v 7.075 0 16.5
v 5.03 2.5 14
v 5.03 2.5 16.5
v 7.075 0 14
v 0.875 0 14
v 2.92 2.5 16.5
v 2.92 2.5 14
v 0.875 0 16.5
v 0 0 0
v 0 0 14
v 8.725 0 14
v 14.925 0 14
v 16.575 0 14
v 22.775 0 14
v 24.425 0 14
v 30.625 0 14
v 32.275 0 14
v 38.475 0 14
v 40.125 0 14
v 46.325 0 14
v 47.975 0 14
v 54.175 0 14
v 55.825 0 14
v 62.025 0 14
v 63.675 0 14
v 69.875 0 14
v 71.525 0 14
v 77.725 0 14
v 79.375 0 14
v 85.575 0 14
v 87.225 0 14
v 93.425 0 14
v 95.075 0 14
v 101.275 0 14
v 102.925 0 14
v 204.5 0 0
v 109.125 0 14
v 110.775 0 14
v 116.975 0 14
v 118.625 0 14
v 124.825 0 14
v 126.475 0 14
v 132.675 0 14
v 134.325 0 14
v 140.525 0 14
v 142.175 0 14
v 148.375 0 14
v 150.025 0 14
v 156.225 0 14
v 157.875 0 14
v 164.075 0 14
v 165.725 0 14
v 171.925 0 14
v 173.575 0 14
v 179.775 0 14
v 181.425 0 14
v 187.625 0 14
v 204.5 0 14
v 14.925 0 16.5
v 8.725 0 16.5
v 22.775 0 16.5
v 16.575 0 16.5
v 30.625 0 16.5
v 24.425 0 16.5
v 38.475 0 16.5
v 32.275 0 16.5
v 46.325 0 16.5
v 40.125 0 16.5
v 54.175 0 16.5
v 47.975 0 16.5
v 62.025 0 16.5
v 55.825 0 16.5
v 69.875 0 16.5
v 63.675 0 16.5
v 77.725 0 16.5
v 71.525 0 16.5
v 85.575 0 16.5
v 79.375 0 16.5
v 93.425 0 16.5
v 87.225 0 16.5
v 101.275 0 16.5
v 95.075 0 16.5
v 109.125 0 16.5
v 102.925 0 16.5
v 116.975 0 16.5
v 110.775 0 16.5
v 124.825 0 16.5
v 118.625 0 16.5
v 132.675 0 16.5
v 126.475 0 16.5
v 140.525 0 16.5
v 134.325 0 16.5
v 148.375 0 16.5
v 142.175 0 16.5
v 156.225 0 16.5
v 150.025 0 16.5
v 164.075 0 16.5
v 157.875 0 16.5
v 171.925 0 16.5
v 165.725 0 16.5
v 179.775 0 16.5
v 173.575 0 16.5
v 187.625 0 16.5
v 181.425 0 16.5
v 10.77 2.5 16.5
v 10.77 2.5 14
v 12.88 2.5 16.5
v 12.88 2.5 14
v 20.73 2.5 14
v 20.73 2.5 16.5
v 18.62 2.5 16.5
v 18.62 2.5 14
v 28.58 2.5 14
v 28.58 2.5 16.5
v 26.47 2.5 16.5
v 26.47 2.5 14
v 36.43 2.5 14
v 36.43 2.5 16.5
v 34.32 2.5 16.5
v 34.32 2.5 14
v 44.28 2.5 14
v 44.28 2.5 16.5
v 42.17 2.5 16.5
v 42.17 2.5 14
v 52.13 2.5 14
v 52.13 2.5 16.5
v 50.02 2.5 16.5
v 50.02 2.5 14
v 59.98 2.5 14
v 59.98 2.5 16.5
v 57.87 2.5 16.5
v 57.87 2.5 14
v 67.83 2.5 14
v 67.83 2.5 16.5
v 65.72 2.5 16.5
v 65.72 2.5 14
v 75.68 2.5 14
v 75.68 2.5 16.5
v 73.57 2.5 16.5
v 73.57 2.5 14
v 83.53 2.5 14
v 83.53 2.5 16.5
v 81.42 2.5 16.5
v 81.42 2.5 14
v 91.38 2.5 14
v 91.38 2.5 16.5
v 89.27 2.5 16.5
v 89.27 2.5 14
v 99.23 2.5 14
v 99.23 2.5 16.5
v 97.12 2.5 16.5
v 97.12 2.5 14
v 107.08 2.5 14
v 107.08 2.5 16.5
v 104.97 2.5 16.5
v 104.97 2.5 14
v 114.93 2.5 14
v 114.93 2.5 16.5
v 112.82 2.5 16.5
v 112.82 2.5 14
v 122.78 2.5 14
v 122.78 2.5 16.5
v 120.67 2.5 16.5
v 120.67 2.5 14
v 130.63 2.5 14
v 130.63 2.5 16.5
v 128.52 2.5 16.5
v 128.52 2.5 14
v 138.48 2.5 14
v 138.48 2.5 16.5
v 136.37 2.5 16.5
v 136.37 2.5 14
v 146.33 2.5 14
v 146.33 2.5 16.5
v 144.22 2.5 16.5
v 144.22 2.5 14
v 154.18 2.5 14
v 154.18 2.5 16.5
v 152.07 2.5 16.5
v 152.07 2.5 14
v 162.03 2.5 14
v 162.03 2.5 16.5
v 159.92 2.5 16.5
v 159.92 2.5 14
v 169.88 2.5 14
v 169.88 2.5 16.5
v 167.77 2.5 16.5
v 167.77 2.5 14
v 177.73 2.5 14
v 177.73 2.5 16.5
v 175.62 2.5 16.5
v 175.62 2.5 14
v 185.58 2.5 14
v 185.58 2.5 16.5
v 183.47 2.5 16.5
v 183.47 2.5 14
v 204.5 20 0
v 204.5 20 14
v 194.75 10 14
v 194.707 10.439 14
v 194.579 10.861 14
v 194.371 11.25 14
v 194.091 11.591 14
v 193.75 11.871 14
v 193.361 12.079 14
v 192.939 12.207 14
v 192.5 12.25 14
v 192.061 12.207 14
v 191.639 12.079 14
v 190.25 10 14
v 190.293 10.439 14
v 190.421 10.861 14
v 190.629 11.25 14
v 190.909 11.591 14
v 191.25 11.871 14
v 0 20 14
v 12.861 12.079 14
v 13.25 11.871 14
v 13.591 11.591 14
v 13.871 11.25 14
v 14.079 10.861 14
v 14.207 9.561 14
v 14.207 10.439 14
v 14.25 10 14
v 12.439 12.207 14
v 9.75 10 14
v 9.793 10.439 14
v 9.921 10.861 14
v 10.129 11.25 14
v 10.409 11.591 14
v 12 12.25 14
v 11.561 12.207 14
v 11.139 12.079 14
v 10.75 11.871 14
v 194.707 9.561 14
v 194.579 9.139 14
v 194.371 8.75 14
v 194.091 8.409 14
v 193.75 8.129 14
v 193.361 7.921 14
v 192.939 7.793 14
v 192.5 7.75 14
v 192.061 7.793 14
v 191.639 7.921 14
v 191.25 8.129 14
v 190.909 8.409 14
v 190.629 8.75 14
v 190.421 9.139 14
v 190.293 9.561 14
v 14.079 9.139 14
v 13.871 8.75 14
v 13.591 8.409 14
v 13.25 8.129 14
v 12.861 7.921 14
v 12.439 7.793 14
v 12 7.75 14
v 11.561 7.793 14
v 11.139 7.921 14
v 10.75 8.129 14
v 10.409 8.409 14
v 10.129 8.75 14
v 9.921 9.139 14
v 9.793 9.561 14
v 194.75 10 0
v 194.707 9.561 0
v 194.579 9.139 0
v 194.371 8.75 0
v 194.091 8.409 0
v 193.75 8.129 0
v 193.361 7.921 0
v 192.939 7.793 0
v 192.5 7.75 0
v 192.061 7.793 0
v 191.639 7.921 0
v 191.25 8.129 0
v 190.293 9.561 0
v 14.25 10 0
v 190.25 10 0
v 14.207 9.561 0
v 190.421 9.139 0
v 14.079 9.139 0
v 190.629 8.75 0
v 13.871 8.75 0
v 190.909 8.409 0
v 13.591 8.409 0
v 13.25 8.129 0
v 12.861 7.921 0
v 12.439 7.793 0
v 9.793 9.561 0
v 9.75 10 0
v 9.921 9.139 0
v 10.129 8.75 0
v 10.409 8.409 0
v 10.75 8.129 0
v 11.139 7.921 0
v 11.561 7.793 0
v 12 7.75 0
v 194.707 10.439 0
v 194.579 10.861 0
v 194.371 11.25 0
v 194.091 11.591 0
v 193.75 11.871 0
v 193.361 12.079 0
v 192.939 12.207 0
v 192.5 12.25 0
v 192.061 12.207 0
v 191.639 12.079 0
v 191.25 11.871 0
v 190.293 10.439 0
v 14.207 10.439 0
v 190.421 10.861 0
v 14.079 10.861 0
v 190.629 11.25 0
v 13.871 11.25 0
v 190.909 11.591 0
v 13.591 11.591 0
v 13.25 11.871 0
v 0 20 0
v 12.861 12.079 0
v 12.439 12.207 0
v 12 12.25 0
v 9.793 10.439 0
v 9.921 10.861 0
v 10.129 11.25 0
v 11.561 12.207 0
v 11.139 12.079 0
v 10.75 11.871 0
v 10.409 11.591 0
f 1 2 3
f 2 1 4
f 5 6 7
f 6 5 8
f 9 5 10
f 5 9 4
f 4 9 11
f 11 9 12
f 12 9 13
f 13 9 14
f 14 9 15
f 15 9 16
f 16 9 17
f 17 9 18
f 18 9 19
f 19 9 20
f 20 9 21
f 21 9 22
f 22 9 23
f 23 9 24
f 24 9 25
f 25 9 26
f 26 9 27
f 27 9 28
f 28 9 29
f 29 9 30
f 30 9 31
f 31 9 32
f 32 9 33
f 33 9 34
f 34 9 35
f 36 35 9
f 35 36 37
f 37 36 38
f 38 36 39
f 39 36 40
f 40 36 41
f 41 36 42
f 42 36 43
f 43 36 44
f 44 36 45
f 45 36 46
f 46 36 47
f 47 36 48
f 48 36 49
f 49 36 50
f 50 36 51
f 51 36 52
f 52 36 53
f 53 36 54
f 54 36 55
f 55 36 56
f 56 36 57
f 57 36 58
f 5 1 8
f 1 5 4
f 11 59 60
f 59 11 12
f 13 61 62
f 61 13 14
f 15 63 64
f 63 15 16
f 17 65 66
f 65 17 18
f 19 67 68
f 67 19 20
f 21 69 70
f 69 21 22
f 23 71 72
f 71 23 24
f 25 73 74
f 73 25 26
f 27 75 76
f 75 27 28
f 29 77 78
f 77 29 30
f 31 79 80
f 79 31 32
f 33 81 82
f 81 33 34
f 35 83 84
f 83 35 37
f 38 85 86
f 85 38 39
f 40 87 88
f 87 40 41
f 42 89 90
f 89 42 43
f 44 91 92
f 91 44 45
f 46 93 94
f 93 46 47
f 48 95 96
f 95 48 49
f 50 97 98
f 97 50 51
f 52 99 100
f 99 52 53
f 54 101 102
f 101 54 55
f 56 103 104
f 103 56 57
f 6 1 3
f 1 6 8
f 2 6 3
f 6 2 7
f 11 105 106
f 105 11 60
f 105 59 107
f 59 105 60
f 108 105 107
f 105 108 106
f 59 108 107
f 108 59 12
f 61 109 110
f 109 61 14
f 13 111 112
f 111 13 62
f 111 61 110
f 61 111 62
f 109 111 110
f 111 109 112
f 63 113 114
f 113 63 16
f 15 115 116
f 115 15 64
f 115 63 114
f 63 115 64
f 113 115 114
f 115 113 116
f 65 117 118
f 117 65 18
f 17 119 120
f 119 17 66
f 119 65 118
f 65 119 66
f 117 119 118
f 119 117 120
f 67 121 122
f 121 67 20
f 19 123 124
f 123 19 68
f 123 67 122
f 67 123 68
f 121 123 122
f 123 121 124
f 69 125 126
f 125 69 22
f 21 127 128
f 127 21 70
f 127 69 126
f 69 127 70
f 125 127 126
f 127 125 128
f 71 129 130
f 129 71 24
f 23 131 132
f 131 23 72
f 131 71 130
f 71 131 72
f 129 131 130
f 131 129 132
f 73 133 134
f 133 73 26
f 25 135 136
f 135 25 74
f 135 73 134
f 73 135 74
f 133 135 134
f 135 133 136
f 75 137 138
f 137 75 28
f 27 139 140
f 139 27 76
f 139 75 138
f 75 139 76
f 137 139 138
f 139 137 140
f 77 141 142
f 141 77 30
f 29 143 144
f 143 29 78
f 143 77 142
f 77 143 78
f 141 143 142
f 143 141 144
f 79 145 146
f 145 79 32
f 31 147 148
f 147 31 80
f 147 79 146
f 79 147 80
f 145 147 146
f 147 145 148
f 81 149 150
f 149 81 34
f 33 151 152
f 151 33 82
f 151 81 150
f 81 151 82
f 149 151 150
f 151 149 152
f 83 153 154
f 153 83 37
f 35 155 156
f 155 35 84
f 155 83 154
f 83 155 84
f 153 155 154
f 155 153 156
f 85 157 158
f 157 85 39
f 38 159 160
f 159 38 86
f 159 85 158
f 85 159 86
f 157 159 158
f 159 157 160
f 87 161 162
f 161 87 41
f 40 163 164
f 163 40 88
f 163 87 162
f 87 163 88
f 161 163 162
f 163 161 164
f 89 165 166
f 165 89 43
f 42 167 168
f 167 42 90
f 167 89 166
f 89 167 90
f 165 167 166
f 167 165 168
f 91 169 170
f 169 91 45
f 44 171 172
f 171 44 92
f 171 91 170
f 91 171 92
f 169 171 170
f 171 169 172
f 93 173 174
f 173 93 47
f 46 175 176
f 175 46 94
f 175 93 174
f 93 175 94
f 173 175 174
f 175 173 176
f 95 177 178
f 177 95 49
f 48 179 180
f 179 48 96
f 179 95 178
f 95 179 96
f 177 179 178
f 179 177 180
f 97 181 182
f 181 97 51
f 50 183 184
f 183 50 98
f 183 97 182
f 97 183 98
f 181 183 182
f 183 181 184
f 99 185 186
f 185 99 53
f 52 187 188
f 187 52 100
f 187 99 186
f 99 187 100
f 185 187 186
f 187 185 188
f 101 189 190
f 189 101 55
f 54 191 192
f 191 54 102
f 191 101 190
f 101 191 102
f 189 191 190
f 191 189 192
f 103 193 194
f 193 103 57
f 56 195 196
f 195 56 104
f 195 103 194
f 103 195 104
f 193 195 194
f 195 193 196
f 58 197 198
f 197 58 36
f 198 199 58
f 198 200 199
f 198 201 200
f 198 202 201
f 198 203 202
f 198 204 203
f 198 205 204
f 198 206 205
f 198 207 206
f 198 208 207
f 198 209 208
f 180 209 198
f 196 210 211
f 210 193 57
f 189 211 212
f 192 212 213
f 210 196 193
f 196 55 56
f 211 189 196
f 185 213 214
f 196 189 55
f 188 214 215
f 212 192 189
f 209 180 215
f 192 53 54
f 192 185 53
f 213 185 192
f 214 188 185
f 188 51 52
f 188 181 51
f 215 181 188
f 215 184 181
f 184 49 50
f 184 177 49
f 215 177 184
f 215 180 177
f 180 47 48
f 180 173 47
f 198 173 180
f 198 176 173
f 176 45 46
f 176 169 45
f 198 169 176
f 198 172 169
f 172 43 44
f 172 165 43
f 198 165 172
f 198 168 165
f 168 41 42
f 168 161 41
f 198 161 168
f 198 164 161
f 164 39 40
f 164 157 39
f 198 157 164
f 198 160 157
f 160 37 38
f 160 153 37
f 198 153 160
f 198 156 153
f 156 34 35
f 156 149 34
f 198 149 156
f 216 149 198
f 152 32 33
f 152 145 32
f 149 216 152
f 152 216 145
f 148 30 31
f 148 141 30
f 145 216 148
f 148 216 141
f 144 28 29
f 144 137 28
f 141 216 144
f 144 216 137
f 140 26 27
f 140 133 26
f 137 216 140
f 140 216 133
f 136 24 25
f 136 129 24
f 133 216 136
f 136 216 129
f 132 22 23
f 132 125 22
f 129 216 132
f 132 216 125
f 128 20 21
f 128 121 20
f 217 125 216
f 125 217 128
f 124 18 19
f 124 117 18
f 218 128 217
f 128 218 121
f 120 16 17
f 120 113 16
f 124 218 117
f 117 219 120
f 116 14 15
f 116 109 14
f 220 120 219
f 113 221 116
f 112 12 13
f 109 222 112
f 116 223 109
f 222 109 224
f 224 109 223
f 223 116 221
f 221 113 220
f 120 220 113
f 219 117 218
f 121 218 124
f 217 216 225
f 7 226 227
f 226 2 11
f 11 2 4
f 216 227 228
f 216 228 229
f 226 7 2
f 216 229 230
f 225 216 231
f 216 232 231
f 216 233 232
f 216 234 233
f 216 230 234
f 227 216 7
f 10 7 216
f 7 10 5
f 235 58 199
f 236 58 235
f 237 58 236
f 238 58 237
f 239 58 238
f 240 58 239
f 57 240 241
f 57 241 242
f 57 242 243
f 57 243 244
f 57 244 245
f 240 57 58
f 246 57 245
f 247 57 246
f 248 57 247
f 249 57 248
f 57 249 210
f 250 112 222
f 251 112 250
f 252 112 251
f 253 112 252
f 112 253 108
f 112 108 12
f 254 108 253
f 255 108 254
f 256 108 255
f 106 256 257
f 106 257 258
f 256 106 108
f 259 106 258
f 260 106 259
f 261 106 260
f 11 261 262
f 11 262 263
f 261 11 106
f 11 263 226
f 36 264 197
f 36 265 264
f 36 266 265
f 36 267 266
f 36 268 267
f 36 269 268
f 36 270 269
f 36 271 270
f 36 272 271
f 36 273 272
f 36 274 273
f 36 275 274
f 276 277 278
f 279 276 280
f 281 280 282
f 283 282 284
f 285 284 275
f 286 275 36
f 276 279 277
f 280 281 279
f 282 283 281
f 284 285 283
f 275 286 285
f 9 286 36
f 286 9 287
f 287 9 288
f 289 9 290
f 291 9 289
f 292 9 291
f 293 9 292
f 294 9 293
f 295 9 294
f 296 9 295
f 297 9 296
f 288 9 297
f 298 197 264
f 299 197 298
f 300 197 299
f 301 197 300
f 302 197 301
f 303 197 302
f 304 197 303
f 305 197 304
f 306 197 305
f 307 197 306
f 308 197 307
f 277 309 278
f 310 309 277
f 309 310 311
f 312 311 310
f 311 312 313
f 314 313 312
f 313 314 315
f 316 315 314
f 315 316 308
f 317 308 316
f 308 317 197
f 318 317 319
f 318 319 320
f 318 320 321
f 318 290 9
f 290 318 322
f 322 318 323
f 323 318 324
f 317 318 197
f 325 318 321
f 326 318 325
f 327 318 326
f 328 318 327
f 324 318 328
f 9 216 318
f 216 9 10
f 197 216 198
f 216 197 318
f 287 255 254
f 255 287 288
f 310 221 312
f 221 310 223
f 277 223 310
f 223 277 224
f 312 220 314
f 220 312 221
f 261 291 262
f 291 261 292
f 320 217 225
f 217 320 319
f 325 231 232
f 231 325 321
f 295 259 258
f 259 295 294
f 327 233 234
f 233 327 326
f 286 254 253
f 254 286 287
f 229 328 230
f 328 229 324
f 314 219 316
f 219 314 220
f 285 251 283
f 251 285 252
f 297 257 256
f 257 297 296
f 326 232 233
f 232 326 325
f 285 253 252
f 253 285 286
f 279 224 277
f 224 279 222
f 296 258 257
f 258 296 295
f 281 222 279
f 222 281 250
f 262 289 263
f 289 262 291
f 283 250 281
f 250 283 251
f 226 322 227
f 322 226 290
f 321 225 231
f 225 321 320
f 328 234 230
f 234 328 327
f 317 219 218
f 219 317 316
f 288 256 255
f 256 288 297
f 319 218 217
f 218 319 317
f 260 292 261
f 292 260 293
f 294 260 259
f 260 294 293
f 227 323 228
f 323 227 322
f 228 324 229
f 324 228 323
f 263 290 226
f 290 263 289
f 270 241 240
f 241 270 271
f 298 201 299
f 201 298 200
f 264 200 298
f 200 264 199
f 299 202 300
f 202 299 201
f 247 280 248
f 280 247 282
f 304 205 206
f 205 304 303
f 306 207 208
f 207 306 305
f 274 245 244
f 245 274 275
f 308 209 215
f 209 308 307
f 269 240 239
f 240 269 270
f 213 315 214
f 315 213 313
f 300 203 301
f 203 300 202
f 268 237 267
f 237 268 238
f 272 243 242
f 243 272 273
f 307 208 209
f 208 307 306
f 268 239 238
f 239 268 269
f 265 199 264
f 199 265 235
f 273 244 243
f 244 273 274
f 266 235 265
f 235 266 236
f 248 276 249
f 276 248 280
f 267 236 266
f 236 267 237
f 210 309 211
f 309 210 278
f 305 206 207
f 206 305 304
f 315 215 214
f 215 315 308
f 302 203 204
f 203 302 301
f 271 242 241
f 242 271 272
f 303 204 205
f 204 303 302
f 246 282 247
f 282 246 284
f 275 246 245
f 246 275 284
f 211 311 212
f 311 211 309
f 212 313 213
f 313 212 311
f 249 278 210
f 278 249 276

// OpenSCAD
$fn = 32;

// ----------------------------------------------------------------------
// Gear rack: m=2.5 z=24, 204.5 x 20 x 16.5 mm
// ----------------------------------------------------------------------

// --- parameters (mm) ---
length = 204.5;           // rack length, X
width = 20;               // rack width, Y
height = 16.5;            // overall height, Z
module_m = 2.5;           // module
back_t = 14;              // tooth root line height
pitch = 7.85;             // circular pitch
tip_w = 2.11;             // tooth thickness at the tip
root_w = 6.2;             // tooth thickness at the root line
hole_d = 4.5;             // mounting hole
sink = 0.6;               // tooth root overlap into the body

tooth_span = 188.5;

module tooth(x0) {
  /* 20 deg flank profile, sunk into the body for a positive overlap */
  translate([x0, 0, back_t - sink])
    linear_extrude(height = height - back_t + sink)
      polygon(points = [[-root_w / 2, 0], [root_w / 2, 0],
                        [tip_w / 2, height - back_t],
                        [-tip_w / 2, height - back_t]]);
}

difference() {
  union() {
    cube([length, width, back_t]);
    for (i = [0 : 24 - 1])
      tooth((i + 0.5) * pitch + (tooth_span - 24 * pitch) / 2);
  }
  translate([12, 10, -1]) cylinder(h = back_t + 2, d = hole_d);
  translate([192.5, 10, -1]) cylinder(h = back_t + 2, d = hole_d);
}
